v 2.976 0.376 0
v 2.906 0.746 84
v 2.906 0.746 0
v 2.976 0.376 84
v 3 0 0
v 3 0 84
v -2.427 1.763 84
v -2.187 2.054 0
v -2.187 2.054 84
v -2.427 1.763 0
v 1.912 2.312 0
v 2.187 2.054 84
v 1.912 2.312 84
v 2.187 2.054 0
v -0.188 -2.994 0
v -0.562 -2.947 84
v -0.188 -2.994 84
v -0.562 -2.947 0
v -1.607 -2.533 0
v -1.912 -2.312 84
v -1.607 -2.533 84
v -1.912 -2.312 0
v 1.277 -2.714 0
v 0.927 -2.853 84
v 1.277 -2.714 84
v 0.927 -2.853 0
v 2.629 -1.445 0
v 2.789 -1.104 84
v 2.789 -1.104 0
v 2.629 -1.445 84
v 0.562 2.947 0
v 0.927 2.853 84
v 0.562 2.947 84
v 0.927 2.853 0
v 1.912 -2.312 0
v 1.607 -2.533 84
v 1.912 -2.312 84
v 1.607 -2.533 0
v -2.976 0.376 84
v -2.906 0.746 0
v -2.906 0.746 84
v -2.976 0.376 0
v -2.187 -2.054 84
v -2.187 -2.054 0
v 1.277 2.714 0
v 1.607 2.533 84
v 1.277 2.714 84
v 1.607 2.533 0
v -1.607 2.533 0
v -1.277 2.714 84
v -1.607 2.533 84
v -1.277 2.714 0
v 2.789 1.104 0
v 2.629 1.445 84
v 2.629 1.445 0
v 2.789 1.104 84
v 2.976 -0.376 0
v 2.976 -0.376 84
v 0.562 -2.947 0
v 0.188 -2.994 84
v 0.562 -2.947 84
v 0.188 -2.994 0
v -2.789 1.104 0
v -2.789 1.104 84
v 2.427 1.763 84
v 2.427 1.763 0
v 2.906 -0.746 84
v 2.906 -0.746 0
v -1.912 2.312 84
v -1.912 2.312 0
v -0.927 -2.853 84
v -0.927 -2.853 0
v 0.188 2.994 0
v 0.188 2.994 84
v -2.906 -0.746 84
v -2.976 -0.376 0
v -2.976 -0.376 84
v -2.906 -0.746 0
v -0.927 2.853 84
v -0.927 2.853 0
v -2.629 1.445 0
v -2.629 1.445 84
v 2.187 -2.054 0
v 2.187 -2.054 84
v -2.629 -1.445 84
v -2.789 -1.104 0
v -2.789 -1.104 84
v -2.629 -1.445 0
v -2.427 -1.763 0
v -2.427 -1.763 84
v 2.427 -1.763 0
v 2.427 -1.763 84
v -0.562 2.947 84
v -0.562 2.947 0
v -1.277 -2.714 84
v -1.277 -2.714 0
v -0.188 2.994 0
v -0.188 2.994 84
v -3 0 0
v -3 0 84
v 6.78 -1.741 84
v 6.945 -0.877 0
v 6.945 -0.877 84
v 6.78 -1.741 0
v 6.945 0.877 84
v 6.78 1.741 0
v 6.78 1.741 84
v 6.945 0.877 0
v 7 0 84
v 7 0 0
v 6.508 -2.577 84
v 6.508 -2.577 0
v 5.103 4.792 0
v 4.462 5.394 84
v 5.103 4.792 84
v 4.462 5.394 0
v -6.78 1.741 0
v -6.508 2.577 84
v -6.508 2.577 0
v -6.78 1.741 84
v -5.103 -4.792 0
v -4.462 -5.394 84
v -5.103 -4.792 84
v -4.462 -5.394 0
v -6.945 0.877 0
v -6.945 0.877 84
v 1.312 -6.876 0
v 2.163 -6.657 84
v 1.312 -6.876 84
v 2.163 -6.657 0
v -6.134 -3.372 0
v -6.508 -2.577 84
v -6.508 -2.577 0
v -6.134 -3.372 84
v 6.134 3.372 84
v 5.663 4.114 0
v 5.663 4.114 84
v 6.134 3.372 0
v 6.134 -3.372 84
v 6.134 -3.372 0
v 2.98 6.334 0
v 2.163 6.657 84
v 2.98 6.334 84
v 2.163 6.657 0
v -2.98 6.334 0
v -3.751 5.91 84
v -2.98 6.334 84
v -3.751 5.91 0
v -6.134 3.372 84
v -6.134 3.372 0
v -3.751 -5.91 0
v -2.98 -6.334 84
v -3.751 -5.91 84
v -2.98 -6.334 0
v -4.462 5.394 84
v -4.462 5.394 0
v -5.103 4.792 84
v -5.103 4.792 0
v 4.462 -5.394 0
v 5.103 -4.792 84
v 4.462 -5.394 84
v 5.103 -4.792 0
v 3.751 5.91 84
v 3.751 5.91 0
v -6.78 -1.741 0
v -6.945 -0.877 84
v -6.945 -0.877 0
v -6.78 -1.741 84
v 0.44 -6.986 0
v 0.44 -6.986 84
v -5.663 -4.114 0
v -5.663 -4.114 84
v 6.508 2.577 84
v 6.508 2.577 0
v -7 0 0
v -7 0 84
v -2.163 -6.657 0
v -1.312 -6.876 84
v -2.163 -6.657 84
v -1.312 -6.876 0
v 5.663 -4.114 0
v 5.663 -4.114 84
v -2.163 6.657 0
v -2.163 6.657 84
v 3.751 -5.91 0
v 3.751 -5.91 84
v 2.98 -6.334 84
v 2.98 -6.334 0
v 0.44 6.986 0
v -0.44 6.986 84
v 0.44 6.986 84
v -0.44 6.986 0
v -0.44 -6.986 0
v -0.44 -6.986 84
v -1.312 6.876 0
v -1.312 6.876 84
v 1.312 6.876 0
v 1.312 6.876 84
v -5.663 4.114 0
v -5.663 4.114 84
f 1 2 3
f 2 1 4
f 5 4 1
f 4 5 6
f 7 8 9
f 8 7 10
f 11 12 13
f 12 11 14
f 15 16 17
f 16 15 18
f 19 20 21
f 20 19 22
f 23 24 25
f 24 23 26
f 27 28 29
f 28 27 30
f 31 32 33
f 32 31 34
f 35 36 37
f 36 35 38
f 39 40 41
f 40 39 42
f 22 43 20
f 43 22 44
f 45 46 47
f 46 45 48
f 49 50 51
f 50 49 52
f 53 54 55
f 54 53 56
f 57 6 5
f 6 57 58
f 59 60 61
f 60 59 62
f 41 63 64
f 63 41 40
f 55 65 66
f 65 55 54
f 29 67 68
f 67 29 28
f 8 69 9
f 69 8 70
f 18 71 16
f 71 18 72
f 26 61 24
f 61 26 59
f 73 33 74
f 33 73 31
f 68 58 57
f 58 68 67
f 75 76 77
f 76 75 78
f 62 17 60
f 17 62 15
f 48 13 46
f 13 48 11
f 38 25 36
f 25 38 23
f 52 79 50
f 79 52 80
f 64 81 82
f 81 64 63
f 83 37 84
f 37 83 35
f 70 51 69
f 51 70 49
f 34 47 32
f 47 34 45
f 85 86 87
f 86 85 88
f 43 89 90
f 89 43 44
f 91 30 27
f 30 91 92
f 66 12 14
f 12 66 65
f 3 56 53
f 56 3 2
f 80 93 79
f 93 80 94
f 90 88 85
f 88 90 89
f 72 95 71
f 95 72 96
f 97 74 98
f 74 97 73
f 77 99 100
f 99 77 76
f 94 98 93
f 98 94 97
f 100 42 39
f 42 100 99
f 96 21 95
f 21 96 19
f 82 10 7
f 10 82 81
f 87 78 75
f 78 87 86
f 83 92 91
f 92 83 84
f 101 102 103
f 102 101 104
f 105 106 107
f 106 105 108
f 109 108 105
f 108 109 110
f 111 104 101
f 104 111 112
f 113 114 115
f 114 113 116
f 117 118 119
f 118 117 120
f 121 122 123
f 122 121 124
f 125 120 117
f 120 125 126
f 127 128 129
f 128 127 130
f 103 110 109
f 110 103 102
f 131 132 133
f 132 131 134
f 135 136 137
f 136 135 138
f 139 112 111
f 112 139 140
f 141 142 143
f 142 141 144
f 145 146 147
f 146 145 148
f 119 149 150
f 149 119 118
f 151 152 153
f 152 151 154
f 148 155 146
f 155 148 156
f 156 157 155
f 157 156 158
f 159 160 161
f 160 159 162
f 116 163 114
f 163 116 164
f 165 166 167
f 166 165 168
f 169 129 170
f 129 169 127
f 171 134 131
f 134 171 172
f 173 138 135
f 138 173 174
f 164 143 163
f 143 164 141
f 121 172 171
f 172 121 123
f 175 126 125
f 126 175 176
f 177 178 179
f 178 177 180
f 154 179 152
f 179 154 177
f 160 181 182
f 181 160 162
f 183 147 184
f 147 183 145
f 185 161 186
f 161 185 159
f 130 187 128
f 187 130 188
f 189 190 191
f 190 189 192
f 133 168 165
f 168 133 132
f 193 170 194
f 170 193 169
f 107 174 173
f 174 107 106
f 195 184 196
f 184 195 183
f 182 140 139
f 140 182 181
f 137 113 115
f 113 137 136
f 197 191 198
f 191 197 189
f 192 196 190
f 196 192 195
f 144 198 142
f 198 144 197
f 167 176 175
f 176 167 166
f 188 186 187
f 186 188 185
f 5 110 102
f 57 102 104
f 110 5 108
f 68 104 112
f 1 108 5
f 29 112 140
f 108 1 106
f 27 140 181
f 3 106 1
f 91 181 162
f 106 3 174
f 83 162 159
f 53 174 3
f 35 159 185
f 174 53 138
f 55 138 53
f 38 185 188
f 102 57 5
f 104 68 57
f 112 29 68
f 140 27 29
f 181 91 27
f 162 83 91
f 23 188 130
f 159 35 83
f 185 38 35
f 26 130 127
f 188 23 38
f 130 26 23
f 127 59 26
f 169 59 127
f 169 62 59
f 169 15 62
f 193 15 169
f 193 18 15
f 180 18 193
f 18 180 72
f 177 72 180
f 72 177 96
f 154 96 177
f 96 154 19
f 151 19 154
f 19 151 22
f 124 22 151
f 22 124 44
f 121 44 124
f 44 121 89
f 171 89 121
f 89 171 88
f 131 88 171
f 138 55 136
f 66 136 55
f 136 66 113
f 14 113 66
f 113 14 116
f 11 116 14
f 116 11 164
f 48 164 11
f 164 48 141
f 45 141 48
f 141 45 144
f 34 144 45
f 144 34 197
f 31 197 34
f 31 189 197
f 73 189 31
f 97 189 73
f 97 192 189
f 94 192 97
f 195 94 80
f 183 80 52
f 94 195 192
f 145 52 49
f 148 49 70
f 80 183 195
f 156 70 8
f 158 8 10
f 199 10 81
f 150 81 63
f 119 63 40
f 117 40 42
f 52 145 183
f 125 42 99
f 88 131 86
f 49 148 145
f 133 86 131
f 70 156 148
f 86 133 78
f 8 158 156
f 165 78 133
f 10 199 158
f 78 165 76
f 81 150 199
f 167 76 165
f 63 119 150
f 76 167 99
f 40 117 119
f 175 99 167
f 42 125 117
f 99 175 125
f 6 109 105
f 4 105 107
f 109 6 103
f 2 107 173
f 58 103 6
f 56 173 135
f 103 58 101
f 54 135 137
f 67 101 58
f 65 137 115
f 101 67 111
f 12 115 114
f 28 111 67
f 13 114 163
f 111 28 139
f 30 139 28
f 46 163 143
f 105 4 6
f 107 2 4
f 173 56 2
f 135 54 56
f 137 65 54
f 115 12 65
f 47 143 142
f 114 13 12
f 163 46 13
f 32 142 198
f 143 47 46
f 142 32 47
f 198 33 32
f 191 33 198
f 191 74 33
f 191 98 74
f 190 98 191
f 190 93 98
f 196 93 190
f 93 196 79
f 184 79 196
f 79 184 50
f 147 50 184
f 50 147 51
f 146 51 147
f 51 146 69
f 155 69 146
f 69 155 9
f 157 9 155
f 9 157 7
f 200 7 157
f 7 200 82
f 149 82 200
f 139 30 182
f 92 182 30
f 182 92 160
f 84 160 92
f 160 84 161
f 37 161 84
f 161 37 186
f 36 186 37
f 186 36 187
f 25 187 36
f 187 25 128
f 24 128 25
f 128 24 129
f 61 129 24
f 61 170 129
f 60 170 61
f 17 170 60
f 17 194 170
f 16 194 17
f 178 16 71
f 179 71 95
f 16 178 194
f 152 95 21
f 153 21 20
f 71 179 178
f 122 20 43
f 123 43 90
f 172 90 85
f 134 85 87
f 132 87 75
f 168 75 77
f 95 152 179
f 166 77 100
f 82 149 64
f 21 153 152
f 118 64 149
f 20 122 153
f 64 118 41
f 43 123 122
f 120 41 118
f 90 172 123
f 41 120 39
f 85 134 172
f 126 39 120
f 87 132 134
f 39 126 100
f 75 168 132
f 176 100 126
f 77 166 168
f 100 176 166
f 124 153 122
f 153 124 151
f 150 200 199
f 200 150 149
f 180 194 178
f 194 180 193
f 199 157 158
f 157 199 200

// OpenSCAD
$fn = 50;


difference() {
	union() {
		cylinder(h = 84, r = 7.0000000000);
	}
	union() {
		translate(v = [0.0000000000, 0.0000000000, -100.0000000000]) {
			cylinder(h = 200, r = 3.0000000000);
		}
		translate(v = [0.0000000000, 0.0000000000, -100.0000000000]) {
			cylinder(h = 200, r = 3.0000000000);
		}
		translate(v = [0.0000000000, 0.0000000000, -100.0000000000]) {
			cylinder(h = 200, r = 3.0000000000);
		}
		translate(v = [0.0000000000, 0.0000000000, -100.0000000000]) {
			cylinder(h = 200, r = 3.0000000000);
		}
	}
}
